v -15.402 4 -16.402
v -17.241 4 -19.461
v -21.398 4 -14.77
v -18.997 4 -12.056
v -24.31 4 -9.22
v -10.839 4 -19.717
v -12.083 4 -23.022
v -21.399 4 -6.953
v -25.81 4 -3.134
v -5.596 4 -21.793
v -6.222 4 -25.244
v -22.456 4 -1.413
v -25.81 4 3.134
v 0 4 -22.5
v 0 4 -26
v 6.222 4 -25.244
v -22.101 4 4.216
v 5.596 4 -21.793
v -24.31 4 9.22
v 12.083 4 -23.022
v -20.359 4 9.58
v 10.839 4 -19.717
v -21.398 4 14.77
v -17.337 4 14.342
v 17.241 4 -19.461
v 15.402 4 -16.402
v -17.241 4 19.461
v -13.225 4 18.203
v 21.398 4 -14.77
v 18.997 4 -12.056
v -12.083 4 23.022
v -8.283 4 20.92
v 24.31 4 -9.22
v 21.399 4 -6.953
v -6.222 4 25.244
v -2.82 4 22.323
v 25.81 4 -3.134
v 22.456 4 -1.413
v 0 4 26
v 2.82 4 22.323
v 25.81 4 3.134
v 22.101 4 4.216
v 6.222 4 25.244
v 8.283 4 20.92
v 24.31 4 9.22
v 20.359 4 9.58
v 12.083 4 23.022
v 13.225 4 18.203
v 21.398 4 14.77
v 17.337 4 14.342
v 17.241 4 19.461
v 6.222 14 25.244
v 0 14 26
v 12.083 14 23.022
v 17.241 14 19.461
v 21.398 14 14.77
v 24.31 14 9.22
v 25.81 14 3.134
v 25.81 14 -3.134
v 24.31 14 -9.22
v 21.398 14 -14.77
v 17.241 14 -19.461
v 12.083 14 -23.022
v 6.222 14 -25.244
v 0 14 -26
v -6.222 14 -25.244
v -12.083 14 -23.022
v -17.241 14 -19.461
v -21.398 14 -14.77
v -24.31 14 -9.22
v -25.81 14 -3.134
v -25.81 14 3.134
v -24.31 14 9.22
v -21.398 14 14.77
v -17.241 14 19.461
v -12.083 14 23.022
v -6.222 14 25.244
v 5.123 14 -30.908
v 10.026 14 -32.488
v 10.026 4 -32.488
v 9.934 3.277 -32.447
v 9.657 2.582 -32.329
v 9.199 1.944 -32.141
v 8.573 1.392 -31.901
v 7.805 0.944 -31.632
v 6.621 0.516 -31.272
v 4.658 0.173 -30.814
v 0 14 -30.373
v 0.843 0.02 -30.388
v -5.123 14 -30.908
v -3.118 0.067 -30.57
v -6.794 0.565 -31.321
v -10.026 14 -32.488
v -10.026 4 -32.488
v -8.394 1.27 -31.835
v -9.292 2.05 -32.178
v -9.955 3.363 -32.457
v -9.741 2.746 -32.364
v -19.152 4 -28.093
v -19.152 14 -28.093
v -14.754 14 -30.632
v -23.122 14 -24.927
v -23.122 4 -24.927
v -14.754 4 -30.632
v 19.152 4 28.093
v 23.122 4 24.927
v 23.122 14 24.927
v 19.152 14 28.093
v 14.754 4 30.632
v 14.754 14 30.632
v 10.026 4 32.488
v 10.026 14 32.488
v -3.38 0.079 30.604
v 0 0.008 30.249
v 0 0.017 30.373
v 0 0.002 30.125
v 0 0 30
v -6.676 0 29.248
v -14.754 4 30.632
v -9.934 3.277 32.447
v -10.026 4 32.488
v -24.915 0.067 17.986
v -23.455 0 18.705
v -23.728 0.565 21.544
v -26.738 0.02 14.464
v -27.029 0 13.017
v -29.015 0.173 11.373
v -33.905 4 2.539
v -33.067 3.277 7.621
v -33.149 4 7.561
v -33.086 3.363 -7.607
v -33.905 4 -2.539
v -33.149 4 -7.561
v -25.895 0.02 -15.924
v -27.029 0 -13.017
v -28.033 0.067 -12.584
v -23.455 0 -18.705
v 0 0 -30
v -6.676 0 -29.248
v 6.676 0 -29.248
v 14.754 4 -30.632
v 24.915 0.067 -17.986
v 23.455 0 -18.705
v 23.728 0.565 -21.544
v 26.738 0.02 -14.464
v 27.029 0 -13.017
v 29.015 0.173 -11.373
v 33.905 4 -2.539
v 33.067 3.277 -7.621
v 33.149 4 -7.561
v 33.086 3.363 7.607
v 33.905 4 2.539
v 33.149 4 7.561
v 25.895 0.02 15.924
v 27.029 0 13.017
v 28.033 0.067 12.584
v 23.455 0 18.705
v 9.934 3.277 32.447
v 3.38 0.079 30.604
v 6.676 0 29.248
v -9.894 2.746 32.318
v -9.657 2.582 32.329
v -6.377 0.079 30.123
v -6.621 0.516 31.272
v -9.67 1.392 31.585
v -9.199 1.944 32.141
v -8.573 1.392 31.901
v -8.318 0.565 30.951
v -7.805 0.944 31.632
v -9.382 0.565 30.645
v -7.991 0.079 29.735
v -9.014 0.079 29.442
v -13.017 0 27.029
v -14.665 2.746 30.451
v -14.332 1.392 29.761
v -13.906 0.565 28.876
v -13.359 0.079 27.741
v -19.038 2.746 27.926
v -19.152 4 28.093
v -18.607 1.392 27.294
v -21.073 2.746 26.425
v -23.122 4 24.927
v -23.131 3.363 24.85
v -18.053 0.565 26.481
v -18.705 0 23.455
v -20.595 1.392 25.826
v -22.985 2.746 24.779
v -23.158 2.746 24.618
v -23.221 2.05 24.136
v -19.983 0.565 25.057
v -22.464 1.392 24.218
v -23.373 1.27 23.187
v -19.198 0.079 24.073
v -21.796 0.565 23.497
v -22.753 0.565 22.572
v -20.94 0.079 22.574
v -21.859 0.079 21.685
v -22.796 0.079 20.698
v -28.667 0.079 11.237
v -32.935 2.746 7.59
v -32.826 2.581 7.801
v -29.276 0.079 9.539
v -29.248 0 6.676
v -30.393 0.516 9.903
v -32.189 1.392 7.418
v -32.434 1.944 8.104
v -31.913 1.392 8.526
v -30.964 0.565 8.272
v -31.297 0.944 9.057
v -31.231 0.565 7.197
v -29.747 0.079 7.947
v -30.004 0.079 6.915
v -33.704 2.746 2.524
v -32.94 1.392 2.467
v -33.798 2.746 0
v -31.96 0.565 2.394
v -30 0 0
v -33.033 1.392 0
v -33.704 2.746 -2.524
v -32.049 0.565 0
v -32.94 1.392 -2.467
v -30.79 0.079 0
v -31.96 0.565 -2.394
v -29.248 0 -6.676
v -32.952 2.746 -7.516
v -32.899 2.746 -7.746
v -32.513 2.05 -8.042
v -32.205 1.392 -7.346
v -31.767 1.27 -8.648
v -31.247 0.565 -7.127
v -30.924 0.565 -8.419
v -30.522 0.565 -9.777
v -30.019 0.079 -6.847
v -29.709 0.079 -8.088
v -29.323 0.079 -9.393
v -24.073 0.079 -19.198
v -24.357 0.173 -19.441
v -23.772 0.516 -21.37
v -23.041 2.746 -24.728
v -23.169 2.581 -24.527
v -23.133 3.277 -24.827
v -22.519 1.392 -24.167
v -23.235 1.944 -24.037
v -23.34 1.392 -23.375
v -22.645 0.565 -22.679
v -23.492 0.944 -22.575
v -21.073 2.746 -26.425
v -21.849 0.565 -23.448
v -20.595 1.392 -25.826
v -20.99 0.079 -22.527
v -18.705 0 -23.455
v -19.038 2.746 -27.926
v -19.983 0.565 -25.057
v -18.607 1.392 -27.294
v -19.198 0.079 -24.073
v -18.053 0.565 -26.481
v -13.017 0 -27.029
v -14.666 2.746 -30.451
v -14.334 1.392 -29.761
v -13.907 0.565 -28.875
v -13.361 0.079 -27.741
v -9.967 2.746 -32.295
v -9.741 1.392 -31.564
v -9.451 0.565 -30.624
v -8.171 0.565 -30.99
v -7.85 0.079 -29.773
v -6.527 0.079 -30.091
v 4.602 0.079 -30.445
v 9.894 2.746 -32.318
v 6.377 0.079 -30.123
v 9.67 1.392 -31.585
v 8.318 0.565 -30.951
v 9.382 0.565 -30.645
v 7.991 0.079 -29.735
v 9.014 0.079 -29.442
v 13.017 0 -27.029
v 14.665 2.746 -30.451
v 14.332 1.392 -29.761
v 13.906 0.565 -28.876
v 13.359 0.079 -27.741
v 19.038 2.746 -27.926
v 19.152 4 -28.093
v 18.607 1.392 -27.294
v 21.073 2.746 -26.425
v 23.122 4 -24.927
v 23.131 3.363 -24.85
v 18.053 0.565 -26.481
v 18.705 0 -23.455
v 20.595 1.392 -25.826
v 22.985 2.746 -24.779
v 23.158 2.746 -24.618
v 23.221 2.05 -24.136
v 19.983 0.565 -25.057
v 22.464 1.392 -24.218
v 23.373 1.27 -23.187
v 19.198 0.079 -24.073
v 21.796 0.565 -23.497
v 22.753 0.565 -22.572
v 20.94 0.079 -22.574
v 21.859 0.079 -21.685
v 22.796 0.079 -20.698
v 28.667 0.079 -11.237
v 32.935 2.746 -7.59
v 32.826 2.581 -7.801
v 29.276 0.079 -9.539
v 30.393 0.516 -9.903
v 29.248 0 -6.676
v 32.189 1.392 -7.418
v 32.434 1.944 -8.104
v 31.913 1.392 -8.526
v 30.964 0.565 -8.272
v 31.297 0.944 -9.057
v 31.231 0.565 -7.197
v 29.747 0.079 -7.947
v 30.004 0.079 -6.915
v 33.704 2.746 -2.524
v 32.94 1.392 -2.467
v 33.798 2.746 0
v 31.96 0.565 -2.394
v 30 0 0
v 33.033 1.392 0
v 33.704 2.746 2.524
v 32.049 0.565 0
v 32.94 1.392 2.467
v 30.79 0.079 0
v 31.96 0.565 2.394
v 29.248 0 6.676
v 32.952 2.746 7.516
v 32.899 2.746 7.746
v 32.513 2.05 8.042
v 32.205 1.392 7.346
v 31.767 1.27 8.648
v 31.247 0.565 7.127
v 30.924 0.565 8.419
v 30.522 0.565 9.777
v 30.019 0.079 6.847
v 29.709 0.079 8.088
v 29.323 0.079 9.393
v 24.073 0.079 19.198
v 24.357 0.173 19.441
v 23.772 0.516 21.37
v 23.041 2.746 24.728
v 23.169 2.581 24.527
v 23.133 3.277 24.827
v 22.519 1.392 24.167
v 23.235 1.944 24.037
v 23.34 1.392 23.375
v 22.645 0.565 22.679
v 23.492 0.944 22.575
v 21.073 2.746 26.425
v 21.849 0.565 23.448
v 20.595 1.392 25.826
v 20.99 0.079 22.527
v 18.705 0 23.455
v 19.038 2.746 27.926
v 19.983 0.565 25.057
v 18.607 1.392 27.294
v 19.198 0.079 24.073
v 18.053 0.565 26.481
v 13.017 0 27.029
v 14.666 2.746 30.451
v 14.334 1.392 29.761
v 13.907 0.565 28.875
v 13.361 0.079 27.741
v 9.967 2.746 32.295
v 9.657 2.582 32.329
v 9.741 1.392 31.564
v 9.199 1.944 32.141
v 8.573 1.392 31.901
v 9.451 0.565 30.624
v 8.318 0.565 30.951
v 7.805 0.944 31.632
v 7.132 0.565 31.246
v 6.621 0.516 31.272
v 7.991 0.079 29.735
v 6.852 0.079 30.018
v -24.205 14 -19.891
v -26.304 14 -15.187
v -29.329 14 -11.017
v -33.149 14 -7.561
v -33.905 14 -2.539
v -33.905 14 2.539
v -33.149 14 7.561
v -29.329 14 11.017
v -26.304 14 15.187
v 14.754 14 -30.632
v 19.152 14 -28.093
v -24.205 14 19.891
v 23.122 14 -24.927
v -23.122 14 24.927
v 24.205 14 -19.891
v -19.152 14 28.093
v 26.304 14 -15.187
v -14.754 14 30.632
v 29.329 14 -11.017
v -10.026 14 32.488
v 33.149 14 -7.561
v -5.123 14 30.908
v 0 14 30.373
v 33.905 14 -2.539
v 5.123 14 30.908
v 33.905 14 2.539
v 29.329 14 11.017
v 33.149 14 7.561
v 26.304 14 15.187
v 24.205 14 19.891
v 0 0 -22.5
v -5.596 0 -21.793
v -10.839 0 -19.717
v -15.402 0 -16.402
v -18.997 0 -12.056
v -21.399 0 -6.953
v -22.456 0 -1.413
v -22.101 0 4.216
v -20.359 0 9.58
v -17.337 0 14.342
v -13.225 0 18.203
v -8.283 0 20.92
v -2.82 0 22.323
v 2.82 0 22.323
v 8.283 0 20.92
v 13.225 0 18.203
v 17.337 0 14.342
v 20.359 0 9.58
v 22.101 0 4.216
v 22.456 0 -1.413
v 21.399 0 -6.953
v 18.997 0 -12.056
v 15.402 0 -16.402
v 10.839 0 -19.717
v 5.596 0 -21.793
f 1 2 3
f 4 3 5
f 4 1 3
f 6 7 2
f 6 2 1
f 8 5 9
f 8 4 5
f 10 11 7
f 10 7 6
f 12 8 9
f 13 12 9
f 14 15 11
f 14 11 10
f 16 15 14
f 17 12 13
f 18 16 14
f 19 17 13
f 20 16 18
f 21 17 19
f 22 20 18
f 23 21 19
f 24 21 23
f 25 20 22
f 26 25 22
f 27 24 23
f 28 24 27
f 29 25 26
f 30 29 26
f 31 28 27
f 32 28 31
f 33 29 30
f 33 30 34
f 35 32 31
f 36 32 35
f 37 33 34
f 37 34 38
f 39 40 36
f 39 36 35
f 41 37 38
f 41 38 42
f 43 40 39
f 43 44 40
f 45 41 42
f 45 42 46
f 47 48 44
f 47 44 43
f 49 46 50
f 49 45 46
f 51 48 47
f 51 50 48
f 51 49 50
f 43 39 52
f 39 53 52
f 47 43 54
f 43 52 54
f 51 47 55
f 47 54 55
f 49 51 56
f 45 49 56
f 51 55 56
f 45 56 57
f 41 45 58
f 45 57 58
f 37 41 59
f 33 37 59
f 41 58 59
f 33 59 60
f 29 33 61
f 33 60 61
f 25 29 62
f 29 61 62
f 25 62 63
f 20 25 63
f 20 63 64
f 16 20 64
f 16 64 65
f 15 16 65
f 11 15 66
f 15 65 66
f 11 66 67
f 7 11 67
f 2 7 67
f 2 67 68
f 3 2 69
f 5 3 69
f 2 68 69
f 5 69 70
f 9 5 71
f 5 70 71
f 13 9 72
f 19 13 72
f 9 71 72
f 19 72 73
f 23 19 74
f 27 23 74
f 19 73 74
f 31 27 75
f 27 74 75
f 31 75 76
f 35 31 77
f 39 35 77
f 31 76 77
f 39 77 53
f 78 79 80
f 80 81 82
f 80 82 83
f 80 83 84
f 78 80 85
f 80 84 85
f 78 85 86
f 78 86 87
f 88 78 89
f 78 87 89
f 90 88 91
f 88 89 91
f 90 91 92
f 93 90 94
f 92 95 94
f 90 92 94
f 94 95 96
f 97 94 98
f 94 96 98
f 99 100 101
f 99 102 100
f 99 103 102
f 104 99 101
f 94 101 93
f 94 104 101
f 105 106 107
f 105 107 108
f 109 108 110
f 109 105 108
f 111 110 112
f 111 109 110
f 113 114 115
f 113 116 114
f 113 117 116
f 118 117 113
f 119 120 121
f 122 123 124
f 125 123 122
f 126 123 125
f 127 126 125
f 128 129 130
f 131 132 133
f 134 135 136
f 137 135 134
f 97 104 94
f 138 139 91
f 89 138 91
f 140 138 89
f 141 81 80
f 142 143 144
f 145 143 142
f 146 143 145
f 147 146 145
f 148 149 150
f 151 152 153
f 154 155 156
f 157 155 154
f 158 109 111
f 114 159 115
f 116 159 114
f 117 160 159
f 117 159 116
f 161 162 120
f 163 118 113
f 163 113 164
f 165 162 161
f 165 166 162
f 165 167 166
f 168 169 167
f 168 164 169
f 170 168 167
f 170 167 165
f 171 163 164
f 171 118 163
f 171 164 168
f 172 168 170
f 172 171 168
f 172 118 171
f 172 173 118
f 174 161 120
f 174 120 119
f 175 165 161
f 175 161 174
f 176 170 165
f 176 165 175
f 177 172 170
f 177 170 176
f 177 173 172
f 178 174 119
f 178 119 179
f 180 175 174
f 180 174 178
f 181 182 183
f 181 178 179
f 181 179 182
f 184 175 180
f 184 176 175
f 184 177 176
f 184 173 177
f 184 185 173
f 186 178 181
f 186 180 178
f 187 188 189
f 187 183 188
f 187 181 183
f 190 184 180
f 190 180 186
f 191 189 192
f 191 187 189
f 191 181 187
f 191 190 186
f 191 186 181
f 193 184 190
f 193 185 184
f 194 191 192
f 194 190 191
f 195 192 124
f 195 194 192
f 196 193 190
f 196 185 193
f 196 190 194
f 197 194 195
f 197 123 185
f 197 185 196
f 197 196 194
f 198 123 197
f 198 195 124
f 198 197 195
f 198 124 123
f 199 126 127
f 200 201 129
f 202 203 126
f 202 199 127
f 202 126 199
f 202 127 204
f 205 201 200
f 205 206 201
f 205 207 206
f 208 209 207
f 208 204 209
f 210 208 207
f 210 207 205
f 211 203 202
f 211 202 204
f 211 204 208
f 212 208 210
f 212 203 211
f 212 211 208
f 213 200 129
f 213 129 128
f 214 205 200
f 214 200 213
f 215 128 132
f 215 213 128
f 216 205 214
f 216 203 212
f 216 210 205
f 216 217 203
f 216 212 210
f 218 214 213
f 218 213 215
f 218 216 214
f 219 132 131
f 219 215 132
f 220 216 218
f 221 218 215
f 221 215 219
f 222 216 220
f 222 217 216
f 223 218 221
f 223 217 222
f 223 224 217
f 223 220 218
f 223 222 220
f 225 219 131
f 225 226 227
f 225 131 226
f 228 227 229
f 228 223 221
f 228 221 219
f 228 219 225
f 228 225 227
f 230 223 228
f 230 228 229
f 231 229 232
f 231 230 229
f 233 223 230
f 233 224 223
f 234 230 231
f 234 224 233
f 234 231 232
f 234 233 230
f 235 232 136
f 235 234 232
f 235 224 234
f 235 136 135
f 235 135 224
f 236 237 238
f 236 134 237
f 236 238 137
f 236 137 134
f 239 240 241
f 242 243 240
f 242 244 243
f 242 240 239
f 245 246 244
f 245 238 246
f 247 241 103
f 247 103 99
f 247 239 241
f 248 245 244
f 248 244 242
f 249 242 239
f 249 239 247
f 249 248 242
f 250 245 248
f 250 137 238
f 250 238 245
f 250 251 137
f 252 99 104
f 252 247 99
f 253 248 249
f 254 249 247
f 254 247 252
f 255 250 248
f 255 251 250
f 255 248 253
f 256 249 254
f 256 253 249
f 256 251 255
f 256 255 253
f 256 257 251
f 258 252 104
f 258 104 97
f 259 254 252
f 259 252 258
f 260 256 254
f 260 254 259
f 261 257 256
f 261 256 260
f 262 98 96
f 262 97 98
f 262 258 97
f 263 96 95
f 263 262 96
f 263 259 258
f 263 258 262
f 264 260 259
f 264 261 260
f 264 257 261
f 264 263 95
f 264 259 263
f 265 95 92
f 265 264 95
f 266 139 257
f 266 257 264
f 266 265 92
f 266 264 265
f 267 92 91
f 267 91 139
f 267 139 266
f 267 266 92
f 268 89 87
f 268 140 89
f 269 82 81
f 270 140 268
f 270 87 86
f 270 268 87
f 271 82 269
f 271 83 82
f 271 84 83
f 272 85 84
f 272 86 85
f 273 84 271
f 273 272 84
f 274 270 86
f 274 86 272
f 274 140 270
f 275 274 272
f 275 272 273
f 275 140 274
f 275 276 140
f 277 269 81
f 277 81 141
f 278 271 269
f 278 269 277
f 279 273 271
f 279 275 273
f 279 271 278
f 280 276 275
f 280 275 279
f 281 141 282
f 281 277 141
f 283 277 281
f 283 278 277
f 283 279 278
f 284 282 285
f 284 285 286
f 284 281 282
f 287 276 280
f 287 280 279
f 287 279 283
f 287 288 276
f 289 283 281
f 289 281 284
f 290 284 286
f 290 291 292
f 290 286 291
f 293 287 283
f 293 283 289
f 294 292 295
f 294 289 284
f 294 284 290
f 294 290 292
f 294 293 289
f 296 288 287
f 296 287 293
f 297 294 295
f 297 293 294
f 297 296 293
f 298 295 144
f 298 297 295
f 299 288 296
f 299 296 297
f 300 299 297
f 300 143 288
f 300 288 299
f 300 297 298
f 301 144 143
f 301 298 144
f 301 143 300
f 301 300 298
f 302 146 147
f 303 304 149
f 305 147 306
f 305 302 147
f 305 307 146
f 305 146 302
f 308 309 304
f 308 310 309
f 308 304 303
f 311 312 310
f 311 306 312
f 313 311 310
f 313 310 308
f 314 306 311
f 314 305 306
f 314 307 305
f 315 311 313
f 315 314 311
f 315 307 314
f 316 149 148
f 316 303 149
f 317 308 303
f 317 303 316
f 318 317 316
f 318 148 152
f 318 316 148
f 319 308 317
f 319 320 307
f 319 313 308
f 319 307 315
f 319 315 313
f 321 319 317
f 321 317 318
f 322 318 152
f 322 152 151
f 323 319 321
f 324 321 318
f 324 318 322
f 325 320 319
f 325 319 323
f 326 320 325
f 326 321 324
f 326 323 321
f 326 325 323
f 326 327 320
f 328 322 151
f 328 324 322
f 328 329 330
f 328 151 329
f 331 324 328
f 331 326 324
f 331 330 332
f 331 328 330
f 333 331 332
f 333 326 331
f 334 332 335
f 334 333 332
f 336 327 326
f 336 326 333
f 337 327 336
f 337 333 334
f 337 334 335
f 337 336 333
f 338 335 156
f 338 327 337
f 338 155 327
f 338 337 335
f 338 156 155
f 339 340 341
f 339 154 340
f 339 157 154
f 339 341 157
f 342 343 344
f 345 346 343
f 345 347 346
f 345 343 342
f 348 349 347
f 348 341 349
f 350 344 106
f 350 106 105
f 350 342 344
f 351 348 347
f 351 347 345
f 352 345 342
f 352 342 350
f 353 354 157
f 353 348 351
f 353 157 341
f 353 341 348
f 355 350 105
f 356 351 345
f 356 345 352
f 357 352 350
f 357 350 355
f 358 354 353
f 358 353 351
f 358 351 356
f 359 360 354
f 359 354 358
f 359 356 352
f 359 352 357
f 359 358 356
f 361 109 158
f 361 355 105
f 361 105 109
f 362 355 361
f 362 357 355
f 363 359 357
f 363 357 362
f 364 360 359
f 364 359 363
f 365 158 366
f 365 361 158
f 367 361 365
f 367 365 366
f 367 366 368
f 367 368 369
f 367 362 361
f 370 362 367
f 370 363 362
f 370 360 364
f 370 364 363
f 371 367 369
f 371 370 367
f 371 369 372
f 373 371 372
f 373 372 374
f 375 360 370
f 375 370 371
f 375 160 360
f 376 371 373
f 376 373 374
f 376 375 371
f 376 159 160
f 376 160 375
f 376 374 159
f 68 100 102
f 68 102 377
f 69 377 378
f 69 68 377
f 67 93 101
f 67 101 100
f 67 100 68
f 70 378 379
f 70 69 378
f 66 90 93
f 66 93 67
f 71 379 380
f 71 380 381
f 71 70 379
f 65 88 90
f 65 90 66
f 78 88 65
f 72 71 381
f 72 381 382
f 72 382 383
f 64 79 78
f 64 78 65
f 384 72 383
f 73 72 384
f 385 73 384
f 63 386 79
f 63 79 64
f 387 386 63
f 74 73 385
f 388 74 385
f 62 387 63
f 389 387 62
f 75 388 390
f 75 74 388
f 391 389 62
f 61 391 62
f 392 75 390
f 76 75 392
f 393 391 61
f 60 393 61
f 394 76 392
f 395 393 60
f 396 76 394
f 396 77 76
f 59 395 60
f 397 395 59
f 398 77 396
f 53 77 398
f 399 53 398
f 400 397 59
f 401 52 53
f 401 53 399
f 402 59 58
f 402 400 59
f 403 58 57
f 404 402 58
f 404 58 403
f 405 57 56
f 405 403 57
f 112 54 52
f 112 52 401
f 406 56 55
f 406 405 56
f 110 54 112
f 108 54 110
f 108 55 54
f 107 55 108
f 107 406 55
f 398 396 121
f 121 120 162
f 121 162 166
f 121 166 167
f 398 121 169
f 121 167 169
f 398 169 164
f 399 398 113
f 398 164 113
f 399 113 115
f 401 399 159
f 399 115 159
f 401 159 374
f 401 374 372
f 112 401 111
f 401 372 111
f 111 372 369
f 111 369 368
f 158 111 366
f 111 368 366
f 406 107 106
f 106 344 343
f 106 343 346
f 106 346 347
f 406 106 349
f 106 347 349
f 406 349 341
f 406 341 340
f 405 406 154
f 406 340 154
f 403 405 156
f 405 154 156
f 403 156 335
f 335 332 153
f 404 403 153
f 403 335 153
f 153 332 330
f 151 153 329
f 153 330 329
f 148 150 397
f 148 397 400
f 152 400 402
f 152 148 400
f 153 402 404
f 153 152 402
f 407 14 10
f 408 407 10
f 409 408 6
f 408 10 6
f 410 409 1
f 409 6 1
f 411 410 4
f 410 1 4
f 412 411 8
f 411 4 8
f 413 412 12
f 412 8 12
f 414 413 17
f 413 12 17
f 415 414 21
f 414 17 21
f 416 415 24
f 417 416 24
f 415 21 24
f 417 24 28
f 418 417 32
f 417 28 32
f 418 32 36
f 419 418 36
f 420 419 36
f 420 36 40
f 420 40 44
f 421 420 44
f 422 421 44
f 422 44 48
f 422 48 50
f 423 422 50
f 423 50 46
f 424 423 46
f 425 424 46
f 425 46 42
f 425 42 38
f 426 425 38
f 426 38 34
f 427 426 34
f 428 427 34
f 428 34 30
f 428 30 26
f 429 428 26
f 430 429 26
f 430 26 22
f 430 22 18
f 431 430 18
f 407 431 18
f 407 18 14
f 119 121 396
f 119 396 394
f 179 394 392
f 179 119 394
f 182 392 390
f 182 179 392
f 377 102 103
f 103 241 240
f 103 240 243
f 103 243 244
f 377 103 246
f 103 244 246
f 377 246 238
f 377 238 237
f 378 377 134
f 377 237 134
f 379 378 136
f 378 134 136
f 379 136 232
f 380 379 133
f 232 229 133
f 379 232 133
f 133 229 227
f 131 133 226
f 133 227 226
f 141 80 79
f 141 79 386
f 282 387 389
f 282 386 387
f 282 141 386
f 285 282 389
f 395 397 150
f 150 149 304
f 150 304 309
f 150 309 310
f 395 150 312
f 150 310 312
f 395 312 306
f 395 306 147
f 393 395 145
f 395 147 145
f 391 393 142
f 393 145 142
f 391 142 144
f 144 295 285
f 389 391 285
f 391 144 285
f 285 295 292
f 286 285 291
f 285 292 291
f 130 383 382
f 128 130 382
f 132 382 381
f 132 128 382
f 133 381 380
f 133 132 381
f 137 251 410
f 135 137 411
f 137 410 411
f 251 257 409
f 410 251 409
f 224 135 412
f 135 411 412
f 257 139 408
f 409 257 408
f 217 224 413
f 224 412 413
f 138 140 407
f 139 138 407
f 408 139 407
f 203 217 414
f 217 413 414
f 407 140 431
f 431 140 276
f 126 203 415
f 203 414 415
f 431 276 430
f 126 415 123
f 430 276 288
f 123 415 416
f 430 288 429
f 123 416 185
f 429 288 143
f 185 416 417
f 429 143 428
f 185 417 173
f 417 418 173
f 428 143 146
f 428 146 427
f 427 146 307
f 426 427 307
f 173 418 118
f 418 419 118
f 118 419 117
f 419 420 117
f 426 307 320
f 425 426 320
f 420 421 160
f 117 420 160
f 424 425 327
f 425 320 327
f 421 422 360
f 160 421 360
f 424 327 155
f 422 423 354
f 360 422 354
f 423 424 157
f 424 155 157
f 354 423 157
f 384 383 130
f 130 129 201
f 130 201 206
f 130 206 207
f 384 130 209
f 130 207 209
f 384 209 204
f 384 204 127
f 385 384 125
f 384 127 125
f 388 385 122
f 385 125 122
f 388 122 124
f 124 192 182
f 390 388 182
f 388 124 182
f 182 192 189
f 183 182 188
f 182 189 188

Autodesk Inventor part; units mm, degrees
ref_plane "YZ Plane" through (0, 0, 0) normal (1, 0, 0) x (0, 1, 0)
ref_plane "XZ Plane" through (0, 0, 0) normal (0, 1, 0) x (-1, 0, 0)
ref_plane "XY Plane" through (0, 0, 0) normal (0, 0, 1) x (1, 0, 0)
sketch "Эскиз1" plane through (0, 0, 0) normal (1, 0, 0) x (0, 1, 0)
  line L0 (0, 0) -> (0, 30)
  line L1 (0, 0) -> (4, 0)
  line L2 (4, 0) -> (4, 26)
  line L3 (4, 26) -> (14, 26)
  line L4 (14, 26) -> (14, 34)
  line L5 (14, 34) -> (4, 34)
  arc A0 (4, 34) -> (0, 30) centre (4, 30) ccw
  point P0 (0, 30)
  dimension "d2" = 4
revolve "Вращение1" add sketch "Эскиз1" angle 360 about axis through (0, 0, 0) along (0, 1, 0)
sketch "Эскиз2" plane through (0, 0, 0) normal (0, -1, 0) x (1, 0, 0)
  circle A0 centre (0, 0) radius 30 projected
sketch "Эскиз3" plane through (0, 0, 0) normal (0, -1, 0) x (1, 0, 0)
  circle A0 centre (0, 0) radius 30 projected
  circle A1 centre (0, 0) radius 30
hole "Отверстие1" at (0, 0, 0) direction (0, 1, 0) diameter 45 end through all
sketch "Эскиз4" plane through (0, 0, 0) normal (0, -1, 0) x (1, 0, 0)
  circle A0 centre (0, 0) radius 30 projected
  circle A1 centre (0, 55.1977) radius 24.8245
  circle A2 centre (47.8026, 27.5988) radius 24.8245
  circle A3 centre (47.8026, -27.5988) radius 24.8245
  circle A4 centre (0, -55.1977) radius 24.8245
  circle A5 centre (-47.8026, -27.5988) radius 24.8245
  circle A6 centre (-47.8026, 27.5988) radius 24.8245
  dimension "d18" = 360
extrude "Выдавливание1" cut sketch "Эскиз4" along normal through all both and the other way through all contours A1 | A2 | A3 | A4 | A5 | A6
thread "Резьба1" size "M52x5" class "6H" standard "ISO Metric profile" full length
properties part number "Крышка"
